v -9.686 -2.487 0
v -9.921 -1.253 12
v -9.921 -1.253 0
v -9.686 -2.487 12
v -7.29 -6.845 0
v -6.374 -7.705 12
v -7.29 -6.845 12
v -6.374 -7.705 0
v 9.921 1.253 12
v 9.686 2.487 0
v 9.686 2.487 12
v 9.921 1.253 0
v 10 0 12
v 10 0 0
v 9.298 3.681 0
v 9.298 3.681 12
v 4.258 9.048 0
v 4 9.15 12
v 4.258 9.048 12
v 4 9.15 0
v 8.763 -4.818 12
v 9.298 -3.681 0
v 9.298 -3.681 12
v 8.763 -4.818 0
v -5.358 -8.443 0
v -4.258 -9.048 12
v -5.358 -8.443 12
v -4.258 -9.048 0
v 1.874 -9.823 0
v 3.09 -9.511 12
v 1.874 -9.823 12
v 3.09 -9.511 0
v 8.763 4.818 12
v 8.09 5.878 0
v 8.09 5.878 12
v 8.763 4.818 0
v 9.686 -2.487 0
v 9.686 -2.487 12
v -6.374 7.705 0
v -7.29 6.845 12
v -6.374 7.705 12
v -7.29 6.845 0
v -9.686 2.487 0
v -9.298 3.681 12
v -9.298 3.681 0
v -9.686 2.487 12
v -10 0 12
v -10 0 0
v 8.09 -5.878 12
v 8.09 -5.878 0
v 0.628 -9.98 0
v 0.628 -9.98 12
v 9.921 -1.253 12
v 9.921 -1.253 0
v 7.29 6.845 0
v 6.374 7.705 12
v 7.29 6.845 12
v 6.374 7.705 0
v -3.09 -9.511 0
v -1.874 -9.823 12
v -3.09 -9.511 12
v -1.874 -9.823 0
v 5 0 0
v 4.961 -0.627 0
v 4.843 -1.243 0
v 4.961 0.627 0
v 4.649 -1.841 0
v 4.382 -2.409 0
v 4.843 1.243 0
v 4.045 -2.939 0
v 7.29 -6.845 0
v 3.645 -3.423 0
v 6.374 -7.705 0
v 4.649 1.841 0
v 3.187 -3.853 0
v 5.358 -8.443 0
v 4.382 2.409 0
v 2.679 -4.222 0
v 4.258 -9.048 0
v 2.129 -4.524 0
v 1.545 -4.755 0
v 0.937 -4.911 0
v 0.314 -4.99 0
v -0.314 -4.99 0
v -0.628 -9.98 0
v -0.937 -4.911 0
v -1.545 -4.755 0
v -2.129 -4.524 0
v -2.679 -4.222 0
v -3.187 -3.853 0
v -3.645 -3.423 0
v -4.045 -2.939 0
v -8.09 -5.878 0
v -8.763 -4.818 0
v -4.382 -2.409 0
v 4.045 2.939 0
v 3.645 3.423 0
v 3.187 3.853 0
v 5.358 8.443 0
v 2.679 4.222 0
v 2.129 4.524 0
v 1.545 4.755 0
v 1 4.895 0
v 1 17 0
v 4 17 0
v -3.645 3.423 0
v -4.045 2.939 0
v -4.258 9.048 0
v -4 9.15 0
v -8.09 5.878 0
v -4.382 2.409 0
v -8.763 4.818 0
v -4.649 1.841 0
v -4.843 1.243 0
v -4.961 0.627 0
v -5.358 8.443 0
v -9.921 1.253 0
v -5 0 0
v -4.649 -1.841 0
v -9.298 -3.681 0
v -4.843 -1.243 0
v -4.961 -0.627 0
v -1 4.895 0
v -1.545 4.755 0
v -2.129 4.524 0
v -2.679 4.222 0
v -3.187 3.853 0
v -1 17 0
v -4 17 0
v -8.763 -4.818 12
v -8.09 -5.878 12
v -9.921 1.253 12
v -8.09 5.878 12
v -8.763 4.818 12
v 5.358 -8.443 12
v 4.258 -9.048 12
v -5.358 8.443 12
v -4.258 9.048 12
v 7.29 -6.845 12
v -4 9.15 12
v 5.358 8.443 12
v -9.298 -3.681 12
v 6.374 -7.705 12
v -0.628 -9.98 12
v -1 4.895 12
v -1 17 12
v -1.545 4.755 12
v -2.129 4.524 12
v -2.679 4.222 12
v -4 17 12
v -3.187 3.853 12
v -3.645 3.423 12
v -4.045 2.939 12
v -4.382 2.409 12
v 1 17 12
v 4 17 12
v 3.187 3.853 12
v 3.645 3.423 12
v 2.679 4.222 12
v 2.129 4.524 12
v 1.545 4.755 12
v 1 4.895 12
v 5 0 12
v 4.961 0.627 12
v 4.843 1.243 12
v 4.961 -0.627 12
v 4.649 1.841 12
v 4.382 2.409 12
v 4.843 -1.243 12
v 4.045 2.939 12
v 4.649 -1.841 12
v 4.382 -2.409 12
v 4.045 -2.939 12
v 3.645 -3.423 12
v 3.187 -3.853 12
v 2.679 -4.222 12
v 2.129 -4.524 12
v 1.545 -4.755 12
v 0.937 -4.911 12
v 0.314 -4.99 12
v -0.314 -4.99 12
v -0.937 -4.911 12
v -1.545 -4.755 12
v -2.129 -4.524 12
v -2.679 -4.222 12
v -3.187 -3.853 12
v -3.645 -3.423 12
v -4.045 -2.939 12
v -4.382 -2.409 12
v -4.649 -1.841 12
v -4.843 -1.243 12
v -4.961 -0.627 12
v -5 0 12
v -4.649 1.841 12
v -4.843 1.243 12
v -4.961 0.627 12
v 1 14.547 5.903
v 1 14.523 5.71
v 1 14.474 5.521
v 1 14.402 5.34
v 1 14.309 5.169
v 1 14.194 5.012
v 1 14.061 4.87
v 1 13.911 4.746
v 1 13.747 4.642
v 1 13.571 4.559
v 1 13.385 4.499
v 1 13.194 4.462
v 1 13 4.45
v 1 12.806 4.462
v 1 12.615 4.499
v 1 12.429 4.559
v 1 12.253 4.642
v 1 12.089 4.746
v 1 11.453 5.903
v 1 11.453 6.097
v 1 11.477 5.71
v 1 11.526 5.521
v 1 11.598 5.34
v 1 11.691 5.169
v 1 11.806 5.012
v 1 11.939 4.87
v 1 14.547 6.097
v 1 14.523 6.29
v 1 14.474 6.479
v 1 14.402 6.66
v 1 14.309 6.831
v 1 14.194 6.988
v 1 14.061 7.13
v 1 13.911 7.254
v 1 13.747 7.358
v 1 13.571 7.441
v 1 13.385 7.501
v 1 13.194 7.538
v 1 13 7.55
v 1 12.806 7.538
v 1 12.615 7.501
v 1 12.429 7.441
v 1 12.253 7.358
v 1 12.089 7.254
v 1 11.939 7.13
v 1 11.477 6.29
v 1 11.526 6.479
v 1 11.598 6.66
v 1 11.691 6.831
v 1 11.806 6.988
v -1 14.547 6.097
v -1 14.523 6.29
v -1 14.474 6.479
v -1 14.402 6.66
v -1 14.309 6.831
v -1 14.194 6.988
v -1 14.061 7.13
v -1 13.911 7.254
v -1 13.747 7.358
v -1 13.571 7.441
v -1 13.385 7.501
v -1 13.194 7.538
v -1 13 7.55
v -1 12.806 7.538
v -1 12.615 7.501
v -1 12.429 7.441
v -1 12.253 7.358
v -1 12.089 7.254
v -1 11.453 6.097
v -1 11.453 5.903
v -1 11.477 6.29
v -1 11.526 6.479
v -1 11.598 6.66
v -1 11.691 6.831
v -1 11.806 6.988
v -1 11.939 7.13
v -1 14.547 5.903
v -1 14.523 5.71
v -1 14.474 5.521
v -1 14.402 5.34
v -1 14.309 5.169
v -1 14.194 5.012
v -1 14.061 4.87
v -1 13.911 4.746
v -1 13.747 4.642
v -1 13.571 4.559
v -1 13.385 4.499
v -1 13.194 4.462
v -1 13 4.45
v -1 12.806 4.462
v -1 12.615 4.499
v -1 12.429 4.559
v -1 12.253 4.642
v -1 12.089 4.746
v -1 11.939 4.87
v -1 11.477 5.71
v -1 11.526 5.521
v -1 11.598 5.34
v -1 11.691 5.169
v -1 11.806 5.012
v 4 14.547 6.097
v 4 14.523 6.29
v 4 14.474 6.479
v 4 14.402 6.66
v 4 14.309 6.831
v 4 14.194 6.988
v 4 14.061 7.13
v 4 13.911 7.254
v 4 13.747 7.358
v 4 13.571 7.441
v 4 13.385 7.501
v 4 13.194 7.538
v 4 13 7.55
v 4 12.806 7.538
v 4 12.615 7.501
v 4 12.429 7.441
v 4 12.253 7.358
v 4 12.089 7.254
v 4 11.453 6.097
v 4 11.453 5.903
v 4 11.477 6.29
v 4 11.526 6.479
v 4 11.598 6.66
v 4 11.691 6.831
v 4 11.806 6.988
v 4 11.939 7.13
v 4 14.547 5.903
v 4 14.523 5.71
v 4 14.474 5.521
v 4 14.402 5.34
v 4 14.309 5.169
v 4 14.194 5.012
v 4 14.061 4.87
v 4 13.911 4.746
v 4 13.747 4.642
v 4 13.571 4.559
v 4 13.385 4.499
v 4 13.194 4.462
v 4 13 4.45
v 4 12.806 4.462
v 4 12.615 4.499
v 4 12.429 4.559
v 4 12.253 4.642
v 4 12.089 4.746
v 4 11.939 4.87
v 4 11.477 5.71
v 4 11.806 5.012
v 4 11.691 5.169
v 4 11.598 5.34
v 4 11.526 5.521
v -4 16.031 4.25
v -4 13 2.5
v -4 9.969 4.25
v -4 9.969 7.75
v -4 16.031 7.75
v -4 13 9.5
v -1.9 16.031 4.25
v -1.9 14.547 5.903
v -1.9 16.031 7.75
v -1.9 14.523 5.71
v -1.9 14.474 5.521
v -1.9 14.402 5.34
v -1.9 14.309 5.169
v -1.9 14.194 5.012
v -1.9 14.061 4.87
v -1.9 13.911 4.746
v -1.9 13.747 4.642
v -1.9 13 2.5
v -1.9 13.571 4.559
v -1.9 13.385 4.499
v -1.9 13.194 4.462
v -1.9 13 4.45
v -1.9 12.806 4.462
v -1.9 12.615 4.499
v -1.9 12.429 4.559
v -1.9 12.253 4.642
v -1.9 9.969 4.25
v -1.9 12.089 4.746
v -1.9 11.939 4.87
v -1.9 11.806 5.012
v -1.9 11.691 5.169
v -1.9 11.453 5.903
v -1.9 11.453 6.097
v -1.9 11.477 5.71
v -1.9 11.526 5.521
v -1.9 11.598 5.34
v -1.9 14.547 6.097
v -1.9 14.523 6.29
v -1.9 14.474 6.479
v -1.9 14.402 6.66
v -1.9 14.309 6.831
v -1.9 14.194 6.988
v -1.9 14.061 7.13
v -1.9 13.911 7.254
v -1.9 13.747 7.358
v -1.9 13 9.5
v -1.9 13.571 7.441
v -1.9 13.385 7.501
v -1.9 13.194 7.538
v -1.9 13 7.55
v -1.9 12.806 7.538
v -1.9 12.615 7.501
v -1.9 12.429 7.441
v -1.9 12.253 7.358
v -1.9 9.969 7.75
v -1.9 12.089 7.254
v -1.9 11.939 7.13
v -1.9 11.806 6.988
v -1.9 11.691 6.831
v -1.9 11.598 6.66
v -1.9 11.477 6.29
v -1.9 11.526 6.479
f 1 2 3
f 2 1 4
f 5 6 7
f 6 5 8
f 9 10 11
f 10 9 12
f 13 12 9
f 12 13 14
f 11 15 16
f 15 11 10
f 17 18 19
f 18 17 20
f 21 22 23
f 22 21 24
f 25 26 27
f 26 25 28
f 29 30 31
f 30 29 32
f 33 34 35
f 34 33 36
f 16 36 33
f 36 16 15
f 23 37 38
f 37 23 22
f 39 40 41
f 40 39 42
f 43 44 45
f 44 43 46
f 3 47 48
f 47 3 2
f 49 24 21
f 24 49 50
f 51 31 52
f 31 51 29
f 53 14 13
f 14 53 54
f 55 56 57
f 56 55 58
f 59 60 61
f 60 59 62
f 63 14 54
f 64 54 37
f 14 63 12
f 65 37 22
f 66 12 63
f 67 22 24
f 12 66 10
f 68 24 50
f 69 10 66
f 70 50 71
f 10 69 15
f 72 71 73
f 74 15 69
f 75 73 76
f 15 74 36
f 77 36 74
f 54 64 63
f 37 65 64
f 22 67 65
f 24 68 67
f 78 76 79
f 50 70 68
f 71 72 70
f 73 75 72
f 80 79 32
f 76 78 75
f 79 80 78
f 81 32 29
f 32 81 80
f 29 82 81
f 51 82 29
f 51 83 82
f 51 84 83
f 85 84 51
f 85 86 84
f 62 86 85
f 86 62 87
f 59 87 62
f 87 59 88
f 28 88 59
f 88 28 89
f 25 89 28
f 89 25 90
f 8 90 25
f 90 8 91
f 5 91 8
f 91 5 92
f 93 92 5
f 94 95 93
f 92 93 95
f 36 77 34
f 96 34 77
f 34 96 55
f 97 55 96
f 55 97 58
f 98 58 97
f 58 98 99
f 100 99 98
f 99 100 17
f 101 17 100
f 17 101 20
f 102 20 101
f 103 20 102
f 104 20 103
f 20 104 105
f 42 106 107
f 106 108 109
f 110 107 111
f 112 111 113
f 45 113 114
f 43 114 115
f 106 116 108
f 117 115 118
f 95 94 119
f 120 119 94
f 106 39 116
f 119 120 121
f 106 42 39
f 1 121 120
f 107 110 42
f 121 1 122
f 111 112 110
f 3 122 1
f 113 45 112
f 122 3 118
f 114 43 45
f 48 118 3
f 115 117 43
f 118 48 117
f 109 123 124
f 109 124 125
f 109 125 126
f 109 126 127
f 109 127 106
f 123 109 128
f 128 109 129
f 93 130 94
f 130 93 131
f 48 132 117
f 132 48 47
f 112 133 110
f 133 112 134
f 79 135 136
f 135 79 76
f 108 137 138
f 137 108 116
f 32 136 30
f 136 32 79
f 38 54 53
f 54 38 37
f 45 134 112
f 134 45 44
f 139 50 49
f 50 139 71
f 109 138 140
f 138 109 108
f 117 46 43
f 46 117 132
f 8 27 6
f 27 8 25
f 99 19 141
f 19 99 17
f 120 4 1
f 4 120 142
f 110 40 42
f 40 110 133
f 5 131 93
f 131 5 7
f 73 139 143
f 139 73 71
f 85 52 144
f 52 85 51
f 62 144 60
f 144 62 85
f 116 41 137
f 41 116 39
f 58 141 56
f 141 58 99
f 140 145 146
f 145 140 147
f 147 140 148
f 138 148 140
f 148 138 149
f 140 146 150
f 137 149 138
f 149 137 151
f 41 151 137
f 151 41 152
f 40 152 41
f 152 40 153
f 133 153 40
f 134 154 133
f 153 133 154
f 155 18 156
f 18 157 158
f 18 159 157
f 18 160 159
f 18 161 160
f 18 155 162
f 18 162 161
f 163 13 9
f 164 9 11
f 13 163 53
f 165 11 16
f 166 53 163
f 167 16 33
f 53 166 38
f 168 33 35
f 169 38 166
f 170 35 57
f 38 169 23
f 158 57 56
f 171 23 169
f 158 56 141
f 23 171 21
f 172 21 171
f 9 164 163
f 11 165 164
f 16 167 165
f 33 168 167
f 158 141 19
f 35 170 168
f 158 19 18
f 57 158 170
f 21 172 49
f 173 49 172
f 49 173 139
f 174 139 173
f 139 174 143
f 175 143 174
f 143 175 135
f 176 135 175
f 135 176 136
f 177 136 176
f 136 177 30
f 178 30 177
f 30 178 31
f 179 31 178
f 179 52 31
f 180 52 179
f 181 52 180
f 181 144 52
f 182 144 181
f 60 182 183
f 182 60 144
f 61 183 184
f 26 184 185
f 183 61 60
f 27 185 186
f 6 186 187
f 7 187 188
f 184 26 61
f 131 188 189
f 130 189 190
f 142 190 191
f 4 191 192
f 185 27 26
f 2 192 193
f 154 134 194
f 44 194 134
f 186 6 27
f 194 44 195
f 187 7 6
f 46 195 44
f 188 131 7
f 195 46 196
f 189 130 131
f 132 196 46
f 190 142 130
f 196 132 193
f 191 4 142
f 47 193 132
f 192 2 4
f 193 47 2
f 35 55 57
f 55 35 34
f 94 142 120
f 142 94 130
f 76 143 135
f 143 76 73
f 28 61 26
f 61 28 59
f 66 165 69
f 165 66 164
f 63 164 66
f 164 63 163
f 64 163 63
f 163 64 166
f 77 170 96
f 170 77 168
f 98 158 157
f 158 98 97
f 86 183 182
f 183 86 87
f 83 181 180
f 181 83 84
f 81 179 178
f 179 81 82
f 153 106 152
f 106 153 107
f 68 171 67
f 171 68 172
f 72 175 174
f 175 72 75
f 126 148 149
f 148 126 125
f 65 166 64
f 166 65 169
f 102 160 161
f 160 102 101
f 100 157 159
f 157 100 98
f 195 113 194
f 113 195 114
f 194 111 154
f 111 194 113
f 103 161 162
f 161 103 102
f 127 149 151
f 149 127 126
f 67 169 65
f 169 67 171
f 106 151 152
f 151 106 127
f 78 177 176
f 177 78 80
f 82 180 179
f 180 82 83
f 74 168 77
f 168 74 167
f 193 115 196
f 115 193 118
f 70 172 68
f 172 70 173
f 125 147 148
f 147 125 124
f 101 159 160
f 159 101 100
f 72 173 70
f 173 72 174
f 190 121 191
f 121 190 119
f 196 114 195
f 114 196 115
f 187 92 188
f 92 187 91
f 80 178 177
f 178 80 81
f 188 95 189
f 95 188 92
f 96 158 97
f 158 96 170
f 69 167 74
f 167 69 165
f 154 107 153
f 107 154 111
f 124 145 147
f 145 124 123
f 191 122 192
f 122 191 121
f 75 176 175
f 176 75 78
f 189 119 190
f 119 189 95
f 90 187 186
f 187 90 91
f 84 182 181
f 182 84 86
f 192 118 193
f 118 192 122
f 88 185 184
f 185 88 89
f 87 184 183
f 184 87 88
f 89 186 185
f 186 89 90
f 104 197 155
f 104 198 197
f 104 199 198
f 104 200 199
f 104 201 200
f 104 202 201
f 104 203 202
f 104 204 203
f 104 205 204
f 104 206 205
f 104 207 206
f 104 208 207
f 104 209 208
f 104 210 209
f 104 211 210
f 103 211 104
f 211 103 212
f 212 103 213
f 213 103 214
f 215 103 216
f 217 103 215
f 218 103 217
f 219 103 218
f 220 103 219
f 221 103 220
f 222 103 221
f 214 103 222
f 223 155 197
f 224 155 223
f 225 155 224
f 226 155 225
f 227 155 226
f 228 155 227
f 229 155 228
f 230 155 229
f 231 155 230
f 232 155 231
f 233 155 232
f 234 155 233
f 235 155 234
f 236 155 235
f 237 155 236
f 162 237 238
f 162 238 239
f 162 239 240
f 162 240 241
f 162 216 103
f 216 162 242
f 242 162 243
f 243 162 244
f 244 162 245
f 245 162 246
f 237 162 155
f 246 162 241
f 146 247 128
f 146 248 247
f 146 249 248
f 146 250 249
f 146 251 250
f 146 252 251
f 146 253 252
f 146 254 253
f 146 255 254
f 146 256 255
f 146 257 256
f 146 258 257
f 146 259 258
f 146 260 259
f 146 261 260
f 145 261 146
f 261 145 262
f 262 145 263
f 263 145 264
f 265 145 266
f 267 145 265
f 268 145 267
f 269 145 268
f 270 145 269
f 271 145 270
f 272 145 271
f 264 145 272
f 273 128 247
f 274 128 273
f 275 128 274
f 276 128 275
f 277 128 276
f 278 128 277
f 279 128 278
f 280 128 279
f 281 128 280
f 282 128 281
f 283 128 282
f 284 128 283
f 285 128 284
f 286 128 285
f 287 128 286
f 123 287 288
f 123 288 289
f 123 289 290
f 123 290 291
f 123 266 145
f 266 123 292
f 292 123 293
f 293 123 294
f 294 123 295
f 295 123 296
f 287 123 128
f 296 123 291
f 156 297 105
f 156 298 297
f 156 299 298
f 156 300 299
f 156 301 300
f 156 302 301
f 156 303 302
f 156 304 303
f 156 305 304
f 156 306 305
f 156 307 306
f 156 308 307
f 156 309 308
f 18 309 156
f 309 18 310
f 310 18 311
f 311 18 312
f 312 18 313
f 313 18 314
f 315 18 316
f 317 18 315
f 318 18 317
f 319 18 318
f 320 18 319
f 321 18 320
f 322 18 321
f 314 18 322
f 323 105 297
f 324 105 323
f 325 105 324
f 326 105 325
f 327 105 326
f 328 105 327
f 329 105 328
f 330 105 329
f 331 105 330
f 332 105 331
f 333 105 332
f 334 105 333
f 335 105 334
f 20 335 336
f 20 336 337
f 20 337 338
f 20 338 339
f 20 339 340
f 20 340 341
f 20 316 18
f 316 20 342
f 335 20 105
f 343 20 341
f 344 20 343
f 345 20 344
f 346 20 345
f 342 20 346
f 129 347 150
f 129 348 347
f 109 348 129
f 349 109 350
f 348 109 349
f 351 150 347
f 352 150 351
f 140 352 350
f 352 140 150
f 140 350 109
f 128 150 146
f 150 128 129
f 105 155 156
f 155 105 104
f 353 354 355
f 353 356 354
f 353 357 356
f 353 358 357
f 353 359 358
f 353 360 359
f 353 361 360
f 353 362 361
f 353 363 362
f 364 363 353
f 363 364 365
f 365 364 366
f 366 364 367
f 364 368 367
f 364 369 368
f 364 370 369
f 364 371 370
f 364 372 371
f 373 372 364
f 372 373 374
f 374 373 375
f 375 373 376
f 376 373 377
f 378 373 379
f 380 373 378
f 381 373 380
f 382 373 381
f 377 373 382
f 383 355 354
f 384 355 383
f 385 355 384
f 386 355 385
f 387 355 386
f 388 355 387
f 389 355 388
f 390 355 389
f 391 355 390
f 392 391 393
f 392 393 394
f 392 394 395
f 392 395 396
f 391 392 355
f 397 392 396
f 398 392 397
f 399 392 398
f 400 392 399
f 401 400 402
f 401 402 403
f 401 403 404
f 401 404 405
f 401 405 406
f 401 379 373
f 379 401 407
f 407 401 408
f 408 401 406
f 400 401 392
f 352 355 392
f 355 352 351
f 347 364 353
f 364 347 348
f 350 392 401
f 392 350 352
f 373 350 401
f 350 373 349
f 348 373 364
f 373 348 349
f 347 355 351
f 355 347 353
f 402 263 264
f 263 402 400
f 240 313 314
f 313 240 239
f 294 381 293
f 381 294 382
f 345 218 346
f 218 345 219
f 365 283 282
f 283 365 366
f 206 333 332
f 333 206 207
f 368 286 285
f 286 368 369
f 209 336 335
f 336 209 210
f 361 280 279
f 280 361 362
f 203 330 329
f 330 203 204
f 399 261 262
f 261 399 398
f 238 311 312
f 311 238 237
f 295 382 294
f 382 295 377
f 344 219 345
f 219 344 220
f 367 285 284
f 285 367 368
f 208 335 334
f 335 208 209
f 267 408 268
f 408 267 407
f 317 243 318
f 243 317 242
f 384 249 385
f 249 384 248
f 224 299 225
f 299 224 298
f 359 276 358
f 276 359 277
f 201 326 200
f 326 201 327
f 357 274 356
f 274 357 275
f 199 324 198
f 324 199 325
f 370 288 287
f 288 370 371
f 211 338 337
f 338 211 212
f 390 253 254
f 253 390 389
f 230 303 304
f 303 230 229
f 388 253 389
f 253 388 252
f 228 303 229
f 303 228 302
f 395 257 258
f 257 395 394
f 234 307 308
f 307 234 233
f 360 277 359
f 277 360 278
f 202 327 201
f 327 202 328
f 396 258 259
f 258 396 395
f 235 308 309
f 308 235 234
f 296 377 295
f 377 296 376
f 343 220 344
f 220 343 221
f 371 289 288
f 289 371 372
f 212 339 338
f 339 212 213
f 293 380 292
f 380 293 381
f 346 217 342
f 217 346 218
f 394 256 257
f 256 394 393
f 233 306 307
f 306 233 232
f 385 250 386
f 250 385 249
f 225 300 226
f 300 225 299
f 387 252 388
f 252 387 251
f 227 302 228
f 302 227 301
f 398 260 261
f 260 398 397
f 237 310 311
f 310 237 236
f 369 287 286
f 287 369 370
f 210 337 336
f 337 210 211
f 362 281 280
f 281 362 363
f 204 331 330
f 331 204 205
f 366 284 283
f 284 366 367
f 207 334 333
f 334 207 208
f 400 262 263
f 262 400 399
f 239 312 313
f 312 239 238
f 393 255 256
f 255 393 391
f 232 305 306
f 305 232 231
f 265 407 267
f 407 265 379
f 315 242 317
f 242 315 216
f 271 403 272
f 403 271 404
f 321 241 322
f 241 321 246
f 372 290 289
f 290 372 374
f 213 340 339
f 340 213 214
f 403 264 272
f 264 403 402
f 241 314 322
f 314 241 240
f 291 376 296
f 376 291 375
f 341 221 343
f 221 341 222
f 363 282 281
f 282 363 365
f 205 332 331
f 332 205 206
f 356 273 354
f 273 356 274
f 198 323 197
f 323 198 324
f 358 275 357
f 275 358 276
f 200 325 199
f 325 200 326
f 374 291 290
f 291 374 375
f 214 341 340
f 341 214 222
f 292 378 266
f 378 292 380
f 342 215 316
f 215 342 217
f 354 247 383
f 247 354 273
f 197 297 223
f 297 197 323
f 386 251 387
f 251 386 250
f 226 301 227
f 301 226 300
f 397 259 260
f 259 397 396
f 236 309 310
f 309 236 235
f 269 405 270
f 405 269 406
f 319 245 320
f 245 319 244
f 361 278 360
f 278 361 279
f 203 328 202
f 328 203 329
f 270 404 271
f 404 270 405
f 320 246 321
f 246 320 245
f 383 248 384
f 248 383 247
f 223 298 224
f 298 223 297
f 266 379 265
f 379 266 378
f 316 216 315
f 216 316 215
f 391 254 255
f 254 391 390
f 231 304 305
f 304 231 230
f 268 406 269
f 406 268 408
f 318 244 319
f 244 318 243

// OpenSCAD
translate(v = [0, 0, 6]){
 
difference(){ 
     

 cylinder (h = 12, r=10
   , center = true, $fn=50);

 cylinder (h = 14, r=5, center = true, $fn=50);
  
translate(v = [0,4.25, 0]) {
 

    cube([2,14,14],center= true);}
} 
}



        
difference(){ 


translate(v = [0, 12, 6]) {

cube([8,10,12],center= true);
}

      
 translate(v = [0,11.5, 6]) {


    cube([2,12,15],center= true);
}


translate(v = [-3,13,6]) {
   rotate ([0,90,0]){
       
     cylinder (2.2, 3.5,3.5, center = true, $fn=6);
     }         
 }  
  
 translate(v = [0,13,6]){ 
     
    rotate ([0,90,0]){
   
   cylinder ( 8.1, 1.55,1.55, center=true, $fn=50);    
       
  } }  
}
